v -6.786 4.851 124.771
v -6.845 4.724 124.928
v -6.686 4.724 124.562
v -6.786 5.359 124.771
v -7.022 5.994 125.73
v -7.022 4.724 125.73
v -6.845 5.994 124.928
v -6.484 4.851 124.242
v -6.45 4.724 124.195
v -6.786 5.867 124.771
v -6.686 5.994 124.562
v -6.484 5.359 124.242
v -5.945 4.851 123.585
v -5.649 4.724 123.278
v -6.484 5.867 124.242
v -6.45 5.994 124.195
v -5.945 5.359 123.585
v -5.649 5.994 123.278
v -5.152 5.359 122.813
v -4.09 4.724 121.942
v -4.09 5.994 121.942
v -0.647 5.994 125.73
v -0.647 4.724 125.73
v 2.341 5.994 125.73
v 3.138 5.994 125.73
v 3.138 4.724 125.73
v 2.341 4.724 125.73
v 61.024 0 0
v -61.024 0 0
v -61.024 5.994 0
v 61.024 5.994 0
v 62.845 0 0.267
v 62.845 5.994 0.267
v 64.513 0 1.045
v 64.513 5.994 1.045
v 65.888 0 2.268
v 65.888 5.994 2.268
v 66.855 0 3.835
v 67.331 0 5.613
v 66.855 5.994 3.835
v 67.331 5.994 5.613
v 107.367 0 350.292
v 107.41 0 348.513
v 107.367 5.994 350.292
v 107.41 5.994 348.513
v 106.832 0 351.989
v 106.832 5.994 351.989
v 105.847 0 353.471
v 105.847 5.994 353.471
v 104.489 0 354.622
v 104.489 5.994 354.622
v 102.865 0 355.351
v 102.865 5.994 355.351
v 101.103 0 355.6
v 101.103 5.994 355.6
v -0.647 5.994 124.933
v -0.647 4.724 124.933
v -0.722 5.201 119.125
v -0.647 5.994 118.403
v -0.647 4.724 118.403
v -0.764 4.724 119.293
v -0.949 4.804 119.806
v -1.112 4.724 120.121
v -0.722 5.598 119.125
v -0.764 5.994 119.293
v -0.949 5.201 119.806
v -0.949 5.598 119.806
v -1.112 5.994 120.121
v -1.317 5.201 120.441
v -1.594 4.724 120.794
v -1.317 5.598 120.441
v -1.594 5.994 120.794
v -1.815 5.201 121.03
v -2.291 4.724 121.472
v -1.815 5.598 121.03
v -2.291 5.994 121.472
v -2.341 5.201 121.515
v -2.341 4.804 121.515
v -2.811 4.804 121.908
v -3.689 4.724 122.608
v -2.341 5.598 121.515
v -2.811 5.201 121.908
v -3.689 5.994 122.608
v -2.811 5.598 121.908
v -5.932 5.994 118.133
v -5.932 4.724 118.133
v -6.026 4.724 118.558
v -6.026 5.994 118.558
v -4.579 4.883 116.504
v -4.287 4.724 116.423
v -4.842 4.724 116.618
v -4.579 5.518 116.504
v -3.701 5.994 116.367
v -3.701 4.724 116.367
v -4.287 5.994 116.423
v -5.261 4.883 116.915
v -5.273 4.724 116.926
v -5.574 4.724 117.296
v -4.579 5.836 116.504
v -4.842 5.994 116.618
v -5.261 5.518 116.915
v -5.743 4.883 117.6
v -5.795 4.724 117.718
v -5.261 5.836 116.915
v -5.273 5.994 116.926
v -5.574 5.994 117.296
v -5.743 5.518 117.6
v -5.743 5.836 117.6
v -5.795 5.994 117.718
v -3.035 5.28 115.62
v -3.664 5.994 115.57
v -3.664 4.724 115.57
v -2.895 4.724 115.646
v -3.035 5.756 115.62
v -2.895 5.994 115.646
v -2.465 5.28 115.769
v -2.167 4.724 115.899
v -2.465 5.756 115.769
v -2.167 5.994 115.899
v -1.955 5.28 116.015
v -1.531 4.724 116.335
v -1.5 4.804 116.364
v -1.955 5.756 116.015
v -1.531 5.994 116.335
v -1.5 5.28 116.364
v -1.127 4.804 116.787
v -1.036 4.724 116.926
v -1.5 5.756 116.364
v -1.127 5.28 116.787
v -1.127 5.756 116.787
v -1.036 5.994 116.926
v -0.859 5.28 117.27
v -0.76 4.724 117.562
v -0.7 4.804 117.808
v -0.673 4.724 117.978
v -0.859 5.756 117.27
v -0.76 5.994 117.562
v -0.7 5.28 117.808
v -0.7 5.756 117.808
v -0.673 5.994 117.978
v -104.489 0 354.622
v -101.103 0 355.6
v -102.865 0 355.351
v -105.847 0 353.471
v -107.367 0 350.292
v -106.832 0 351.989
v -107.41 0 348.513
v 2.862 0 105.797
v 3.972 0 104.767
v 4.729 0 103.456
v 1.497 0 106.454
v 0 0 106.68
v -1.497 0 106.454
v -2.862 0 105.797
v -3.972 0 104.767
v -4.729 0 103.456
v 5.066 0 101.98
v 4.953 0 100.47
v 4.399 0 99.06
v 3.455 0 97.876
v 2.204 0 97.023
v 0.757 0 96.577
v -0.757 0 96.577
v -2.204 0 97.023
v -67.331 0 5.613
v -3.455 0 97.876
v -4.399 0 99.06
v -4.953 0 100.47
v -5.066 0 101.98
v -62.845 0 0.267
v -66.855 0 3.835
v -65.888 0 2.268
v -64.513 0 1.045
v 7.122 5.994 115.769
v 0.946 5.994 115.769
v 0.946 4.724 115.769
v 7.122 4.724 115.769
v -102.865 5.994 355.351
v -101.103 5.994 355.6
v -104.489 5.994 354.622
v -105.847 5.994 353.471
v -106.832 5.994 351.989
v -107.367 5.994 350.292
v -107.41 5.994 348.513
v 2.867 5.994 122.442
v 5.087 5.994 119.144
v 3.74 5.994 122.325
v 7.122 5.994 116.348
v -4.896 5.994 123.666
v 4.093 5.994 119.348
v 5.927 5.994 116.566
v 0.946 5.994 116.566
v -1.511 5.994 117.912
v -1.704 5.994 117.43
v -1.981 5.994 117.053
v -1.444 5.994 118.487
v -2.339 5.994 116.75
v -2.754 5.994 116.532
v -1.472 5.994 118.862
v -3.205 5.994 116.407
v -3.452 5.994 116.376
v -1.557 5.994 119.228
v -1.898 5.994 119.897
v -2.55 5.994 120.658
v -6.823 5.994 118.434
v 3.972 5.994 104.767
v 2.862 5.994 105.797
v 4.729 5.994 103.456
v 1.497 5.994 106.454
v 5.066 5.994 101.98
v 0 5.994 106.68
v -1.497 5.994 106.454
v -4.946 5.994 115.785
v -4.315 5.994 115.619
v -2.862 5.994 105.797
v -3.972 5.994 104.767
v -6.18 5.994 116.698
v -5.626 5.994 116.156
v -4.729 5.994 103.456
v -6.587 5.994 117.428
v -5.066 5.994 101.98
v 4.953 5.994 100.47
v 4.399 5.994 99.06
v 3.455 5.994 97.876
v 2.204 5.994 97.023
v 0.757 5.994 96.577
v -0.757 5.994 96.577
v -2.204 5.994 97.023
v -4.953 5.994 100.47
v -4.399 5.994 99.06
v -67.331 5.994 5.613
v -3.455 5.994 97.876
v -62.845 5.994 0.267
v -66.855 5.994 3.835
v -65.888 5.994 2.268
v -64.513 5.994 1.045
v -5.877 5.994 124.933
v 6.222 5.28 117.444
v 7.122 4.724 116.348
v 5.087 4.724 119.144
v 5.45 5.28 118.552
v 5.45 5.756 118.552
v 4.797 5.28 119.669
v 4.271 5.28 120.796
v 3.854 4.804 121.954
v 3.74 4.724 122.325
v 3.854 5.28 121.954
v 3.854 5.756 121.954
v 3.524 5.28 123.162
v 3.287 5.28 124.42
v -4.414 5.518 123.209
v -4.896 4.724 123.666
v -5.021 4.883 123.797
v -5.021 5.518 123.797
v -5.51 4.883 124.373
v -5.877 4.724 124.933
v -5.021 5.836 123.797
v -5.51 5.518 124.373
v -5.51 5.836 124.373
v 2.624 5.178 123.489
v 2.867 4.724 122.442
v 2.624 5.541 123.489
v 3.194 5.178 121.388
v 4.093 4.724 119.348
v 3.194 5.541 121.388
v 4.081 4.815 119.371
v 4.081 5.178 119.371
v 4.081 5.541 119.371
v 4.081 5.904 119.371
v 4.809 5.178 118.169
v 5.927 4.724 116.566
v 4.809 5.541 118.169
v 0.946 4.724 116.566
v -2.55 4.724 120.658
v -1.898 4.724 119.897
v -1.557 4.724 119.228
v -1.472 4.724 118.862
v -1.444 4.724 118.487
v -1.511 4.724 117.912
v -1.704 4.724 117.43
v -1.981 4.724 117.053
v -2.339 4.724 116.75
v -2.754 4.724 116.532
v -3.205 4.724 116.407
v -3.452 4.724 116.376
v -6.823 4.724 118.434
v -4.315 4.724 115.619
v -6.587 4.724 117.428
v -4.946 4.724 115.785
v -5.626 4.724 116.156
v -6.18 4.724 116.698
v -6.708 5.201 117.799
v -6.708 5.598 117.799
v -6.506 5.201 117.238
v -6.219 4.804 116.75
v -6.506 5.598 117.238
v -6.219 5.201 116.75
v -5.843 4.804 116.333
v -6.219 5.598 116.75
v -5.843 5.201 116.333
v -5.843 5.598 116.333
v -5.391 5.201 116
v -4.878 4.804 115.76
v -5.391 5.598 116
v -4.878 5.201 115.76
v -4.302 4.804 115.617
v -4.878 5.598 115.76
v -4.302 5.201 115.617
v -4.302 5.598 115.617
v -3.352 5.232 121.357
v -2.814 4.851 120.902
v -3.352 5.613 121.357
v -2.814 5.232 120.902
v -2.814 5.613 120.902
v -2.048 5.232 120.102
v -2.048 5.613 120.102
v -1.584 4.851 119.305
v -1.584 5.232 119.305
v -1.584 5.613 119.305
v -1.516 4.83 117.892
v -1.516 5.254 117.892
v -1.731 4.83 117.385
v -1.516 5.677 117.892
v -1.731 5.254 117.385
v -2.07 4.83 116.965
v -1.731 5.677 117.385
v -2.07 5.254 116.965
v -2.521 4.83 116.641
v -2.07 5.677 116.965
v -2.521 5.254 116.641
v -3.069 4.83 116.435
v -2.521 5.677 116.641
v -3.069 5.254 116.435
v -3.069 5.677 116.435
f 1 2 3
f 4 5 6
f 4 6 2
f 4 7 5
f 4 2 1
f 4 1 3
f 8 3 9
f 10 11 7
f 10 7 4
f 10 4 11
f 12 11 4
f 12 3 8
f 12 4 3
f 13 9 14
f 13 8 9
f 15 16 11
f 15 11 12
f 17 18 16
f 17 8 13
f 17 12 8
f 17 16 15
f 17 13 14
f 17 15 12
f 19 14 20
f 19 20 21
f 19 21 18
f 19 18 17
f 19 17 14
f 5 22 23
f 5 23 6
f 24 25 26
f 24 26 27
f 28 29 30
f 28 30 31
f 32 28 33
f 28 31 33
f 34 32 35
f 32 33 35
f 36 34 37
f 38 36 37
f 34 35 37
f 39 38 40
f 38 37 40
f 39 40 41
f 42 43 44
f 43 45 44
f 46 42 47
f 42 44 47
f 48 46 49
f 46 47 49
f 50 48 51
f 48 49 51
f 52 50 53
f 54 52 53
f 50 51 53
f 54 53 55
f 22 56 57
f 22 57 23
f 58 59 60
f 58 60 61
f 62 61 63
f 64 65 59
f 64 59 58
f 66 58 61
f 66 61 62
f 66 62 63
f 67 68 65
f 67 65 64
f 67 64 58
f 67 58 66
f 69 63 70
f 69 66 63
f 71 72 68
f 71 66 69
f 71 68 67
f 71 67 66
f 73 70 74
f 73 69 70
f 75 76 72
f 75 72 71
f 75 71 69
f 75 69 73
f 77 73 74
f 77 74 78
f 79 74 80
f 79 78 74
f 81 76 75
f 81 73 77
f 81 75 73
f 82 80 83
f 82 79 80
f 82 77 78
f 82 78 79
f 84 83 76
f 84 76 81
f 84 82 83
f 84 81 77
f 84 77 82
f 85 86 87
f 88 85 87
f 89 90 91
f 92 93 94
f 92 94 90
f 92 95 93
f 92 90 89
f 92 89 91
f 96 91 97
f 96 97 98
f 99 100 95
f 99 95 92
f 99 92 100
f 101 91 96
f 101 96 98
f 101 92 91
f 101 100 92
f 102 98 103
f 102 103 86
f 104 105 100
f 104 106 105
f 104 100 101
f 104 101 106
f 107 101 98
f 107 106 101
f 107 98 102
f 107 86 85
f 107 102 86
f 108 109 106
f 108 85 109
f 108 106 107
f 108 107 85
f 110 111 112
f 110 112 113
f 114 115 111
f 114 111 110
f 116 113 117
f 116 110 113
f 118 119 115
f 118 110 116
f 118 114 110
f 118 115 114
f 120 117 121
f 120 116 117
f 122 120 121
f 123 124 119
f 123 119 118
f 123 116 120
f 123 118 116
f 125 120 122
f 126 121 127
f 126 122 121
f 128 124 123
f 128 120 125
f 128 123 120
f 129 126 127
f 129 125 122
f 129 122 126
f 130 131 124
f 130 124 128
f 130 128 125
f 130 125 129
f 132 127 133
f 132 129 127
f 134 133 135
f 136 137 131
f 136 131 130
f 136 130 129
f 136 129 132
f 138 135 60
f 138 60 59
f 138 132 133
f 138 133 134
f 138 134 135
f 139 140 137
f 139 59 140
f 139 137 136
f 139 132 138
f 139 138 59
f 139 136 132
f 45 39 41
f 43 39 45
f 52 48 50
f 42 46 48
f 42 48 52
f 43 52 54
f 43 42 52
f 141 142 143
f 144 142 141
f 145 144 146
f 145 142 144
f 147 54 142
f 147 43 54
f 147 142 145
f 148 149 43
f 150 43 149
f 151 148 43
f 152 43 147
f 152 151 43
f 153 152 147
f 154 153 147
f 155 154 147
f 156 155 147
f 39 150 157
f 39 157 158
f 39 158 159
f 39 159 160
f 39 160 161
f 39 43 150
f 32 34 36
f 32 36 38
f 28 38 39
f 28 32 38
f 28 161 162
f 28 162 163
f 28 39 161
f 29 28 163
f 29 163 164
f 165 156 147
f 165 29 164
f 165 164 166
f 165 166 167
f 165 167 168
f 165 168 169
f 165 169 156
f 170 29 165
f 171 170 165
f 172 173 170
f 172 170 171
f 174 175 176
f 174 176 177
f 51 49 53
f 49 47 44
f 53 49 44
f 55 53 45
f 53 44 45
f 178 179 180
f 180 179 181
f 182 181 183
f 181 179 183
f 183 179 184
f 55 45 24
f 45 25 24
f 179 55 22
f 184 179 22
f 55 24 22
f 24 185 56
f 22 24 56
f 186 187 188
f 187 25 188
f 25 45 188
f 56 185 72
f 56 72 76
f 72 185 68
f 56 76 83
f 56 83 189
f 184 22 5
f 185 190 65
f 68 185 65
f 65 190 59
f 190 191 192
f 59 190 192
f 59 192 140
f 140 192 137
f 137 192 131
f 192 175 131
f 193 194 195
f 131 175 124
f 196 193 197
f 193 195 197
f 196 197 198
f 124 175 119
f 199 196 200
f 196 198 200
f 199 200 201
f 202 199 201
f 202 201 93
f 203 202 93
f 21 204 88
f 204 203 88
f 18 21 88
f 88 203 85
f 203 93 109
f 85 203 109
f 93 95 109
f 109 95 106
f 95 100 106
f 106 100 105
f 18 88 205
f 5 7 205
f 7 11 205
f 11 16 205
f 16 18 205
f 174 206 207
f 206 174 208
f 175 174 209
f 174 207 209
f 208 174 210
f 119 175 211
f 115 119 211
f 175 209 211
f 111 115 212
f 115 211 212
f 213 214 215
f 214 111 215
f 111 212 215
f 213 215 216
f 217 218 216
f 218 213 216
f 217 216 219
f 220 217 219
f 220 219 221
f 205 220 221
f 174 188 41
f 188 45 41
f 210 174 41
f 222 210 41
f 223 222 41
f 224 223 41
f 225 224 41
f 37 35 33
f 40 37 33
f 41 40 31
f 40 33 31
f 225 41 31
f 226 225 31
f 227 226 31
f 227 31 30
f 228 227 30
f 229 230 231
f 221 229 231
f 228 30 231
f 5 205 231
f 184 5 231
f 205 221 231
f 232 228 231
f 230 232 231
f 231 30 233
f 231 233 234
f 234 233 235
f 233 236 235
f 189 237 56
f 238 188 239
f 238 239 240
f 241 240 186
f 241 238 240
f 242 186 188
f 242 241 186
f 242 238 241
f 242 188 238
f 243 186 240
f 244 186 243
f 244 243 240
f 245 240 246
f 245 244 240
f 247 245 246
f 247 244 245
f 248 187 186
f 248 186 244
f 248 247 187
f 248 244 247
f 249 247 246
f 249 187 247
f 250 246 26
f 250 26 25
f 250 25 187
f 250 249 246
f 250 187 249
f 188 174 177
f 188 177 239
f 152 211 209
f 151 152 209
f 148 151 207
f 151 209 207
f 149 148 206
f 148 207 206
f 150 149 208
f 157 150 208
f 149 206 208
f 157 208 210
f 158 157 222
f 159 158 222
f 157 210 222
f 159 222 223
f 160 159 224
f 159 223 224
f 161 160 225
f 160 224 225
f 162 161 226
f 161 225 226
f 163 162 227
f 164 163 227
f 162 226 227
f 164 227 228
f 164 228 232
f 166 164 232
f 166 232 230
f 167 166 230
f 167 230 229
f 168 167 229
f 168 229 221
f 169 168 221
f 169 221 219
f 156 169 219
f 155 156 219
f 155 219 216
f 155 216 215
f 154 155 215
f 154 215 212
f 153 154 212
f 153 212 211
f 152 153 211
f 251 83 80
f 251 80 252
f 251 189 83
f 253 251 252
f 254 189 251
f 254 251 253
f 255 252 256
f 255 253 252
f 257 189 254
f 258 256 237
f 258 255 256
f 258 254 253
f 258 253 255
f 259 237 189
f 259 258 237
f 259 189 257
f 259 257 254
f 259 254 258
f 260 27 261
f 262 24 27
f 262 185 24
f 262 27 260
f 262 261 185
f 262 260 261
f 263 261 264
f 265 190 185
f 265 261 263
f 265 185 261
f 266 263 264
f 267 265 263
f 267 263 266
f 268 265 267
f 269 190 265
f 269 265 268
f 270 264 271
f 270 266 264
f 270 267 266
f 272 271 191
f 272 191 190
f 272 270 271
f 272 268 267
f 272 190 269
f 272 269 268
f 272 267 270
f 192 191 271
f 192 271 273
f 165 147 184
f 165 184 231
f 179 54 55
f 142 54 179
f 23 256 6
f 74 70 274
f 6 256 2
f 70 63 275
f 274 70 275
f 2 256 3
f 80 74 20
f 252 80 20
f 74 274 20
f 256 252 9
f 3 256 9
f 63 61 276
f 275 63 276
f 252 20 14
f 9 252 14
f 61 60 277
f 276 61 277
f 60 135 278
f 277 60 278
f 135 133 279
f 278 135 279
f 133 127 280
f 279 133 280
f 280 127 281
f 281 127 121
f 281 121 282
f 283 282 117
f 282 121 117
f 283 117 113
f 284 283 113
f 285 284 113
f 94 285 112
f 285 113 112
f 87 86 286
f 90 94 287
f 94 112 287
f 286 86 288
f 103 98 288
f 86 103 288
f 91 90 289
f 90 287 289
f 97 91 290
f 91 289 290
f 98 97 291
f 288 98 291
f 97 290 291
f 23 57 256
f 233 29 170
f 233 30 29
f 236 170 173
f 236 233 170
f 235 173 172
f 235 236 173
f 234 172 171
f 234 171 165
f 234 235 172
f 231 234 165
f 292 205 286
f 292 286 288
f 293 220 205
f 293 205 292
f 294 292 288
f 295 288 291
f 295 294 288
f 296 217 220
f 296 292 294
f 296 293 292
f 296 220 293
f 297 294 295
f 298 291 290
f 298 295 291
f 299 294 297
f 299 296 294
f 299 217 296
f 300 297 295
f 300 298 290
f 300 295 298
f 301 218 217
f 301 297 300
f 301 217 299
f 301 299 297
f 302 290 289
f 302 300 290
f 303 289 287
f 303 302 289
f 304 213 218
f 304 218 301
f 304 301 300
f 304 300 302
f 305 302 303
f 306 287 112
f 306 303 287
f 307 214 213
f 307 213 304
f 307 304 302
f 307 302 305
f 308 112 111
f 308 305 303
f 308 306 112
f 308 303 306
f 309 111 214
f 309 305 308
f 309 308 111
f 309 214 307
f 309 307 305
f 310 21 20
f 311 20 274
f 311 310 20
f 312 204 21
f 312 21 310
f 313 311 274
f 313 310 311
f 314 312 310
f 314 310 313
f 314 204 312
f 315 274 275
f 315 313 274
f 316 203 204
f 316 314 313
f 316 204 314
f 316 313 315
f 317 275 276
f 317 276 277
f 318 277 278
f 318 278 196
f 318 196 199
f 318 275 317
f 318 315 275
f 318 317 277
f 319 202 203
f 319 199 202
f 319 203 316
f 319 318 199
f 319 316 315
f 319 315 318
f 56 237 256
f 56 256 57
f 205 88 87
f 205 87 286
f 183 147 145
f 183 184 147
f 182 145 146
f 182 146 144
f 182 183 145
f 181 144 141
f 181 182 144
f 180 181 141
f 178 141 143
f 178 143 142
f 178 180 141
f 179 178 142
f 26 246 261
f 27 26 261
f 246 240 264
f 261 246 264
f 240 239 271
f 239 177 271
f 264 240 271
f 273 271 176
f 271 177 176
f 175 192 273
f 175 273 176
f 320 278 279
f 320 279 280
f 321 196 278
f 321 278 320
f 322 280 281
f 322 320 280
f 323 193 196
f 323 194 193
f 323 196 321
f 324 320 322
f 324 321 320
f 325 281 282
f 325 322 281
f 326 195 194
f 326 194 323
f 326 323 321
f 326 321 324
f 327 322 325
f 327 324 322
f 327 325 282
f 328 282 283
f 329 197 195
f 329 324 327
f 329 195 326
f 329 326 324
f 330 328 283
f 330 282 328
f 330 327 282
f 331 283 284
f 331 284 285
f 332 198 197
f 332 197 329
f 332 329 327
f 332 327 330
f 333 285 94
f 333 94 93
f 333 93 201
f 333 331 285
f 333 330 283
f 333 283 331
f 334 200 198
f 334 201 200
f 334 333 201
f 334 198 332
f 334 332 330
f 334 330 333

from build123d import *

# Parameters (mm, degrees)
BOSS_EXTRUDE1_DEPTH = 5.9944
SKETCH2_R           = 5.08
CUT_EXTRUDE1_DEPTH  = 372.756512027
CUT_EXTRUDE2_DEPTH  = 1.27
FILLET1_R           = 6.35


with BuildPart() as part:
    # Sketch1 → Boss-Extrude1 (new body)
    with BuildSketch(Plane(origin=(0, 0, 0), x_dir=(1, 0, 0), z_dir=(0, 1, 0))):
        Polygon((-66.675, 0), (66.675, 0), (108.238677943, -355.6), (-108.238677943, -355.6), align=None)
    extrude(amount=BOSS_EXTRUDE1_DEPTH)

    # Sketch2 → Cut-Extrude1 (cut, through all)
    with BuildSketch(Plane(origin=(0, 5.9944, 0), x_dir=(1, 0, 0), z_dir=(0, 1, 0))):
        with Locations(Location((0, -101.6, 0), (0, 0, 270))):
            Circle(SKETCH2_R)
    extrude(amount=-CUT_EXTRUDE1_DEPTH, mode=Mode.SUBTRACT)

    # Sketch3 → Cut-Extrude2 (cut)
    with BuildSketch(Plane(origin=(0, 5.9944, 0), x_dir=(1, 0, 0), z_dir=(0, 1, 0))):
        with BuildLine():
            Line((-0.64745098, -125.73), (-7.022352941, -125.73))
            add(Edge.make_bspline(
                [(-7.022352941, -125.73), (-6.995700037, -125.56647139), (-6.94264637, -125.240961184), (-6.822439521, -124.833851847), (-6.660985096, -124.502541973), (-6.475064564, -124.222842773), (-6.235482524, -123.909374898), (-5.933210944, -123.565961589), (-5.569119359, -123.193461978), (-5.137584514, -122.795086731), (-4.639123135, -122.372704423), (-4.278935295, -122.089977316), (-4.090147059, -121.941789216)],
                knots=[0, 0, 0, 0, 1.00794059, 2.006345856, 2.568221262, 3.244176762, 4.045978883, 4.967707078, 6.025786227, 7.214078669, 8.539791974, 10, 10, 10, 10], degree=3))
            add(Edge.make_bspline(
                [(-4.090147059, -121.941789216), (-3.959237505, -121.839291022), (-3.712095896, -121.645786669), (-3.367780634, -121.370812364), (-3.073520037, -121.12638684), (-2.749807849, -120.849934026), (-2.401956914, -120.521669006), (-2.050459284, -120.119964738), (-1.769921232, -119.720001197), (-1.574792785, -119.317093709), (-1.462696622, -118.90576348), (-1.450487068, -118.627391436), (-1.444313725, -118.486642157)],
                knots=[0, 0, 0, 0, 1.105083233, 2.086265203, 2.928643677, 3.647492745, 4.915719202, 6.103603942, 7.190110835, 8.152548768, 9.065899631, 10, 10, 10, 10], degree=3))
            add(Edge.make_bspline(
                [(-1.444313725, -118.486642157), (-1.447965678, -118.383696155), (-1.455062496, -118.183641793), (-1.508208178, -117.89411156), (-1.598896834, -117.626810225), (-1.725875028, -117.381877206), (-1.879897972, -117.157206868), (-2.067602091, -116.959226462), (-2.280144186, -116.783379567), (-2.521172126, -116.634524628), (-2.784585903, -116.511539466), (-3.072628503, -116.429562416), (-3.379272721, -116.373277743), (-3.591834853, -116.369040126), (-3.701053922, -116.366862745)],
                knots=[0, 0, 0, 0, 1.066440105, 2.072406788, 3.038089023, 3.980626898, 4.923164774, 5.851240192, 6.79842777, 7.774055624, 8.779619978, 9.800248095, 10.869719403, 12, 12, 12, 12], degree=3))
            add(Edge.make_bspline(
                [(-3.701053922, -116.366862745), (-3.856272912, -116.372784339), (-4.153856816, -116.384137145), (-4.575842478, -116.488503349), (-4.94872481, -116.662202163), (-5.273158686, -116.90555858), (-5.541086806, -117.223699711), (-5.760536331, -117.605911882), (-5.924737114, -118.058408876), (-5.991270058, -118.385922919), (-6.02627451, -118.558235294)],
                knots=[0, 0, 0, 0, 1.052503955, 2.0178474, 2.928593632, 3.828899676, 4.748107049, 5.732867451, 6.807211463, 8, 8, 8, 8], degree=3))
            Line((-6.02627451, -118.558235294), (-6.823137255, -118.43372549))
            add(Edge.make_bspline(
                [(-6.823137255, -118.43372549), (-6.80933515, -118.324490516), (-6.782336166, -118.110810556), (-6.71294302, -117.80167694), (-6.623223382, -117.510865089), (-6.510230906, -117.238067127), (-6.37723078, -116.983643092), (-6.222961391, -116.746154212), (-6.045126303, -116.528535029), (-5.846128896, -116.329076963), (-5.627309849, -116.151961167), (-5.393797446, -115.994859502), (-5.142464654, -115.86447923), (-4.877381927, -115.754431463), (-4.595667611, -115.670607699), (-4.298686261, -115.611680986), (-3.986147006, -115.577611658), (-3.772730074, -115.57257374), (-3.66370098, -115.57)],
                knots=[0, 0, 0, 0, 1.11558569, 2.182252598, 3.206865404, 4.197163727, 5.171016007, 6.113287932, 7.062752653, 8.014719109, 8.96418383, 9.912249364, 10.862587531, 11.829428462, 12.817713982, 13.836697005, 14.894825442, 16, 16, 16, 16], degree=3))
            add(Edge.make_bspline(
                [(-3.66370098, -115.57), (-3.556720592, -115.572319789), (-3.346239788, -115.576883907), (-3.037889894, -115.614942211), (-2.744018161, -115.6768103), (-2.465296832, -115.763662981), (-2.202890774, -115.877884746), (-1.951202346, -116.010088278), (-1.717482433, -116.17490368), (-1.497639325, -116.359297976), (-1.299748734, -116.564753592), (-1.122645846, -116.782681404), (-0.976555662, -117.018893798), (-0.853169483, -117.266964655), (-0.764695454, -117.53292748), (-0.694872253, -117.809240088), (-0.653577585, -118.101497133), (-0.649522593, -118.30078564), (-0.64745098, -118.402598039)],
                knots=[0, 0, 0, 0, 1.106681904, 2.177364475, 3.209175827, 4.210887483, 5.192078542, 6.167200624, 7.147039734, 8.145062256, 9.132109826, 10.094560107, 11.044836899, 12.000375742, 12.954465884, 13.938765234, 14.946957558, 16, 16, 16, 16], degree=3))
            add(Edge.make_bspline(
                [(-0.64745098, -118.402598039), (-0.651019305, -118.525228757), (-0.6580732, -118.767646194), (-0.715129167, -119.12624646), (-0.813824447, -119.47254261), (-0.943374808, -119.810657932), (-1.113892336, -120.134164725), (-1.314350095, -120.448008584), (-1.547654564, -120.749083332), (-1.770342076, -120.99003171), (-1.97351953, -121.182307301), (-2.148031694, -121.345116208), (-2.346754424, -121.522181935), (-2.570668292, -121.711175794), (-2.818646639, -121.913074715), (-3.084581883, -122.135434202), (-3.377659732, -122.368392422), (-3.582554579, -122.526226013), (-3.688602941, -122.607916667)],
                knots=[0, 0, 0, 0, 1.088993338, 2.152731221, 3.214950677, 4.282992305, 5.363056107, 6.45734114, 7.587448717, 8.741912054, 9.367708333, 10.072059012, 10.861970471, 11.731730561, 12.674646287, 13.702521352, 14.810883478, 16, 16, 16, 16], degree=3))
            add(Edge.make_bspline(
                [(-3.688602941, -122.607916667), (-3.814880187, -122.707673071), (-4.061272368, -122.90231778), (-4.409564614, -123.201952264), (-4.73097902, -123.495186281), (-5.017964452, -123.789920338), (-5.277411759, -124.07905832), (-5.50700849, -124.36473001), (-5.710619134, -124.64507084), (-5.822395863, -124.838757211), (-5.876862745, -124.933137255)],
                knots=[0, 0, 0, 0, 1.201760701, 2.344875646, 3.430713183, 4.449969728, 5.415927222, 6.330865599, 7.186659457, 8, 8, 8, 8], degree=3))
            Line((-5.876862745, -124.933137255), (-0.64745098, -124.933137255))
            Line((-0.64745098, -124.933137255), (-0.64745098, -125.73))
        make_face()
        with BuildLine():
            add(Edge.make_bspline(
                [(7.121960784, -116.348186275), (6.966339865, -116.529937257), (6.658951614, -116.888938584), (6.220934138, -117.43618394), (5.820990618, -117.99084912), (5.449181724, -118.546249507), (5.106128688, -119.103037308), (4.794532343, -119.662337897), (4.516462749, -120.225992354), (4.26698415, -120.792977059), (4.044548147, -121.3683878), (3.850270964, -121.955372575), (3.67057882, -122.552241729), (3.519790538, -123.16358515), (3.387268651, -123.786079212), (3.284032091, -124.423321677), (3.193868357, -125.071600422), (3.156448534, -125.509818618), (3.137647059, -125.73)],
                knots=[0, 0, 0, 0, 1.105388324, 2.183404297, 3.237157451, 4.263515625, 5.270618974, 6.257661546, 7.220201142, 8.173180298, 9.11857031, 10.06900231, 11.029056015, 11.99749775, 12.977109533, 13.9684726, 14.979265319, 16, 16, 16, 16], degree=3))
            Line((3.137647059, -125.73), (2.340784314, -125.73))
            add(Edge.make_bspline(
                [(2.340784314, -125.73), (2.370678975, -125.349642584), (2.429735016, -124.598257492), (2.61102689, -123.492894729), (2.858878127, -122.422284677), (3.182435664, -121.380929429), (3.581330157, -120.3591781), (3.949835575, -119.60787323), (4.230188707, -119.095806913), (4.404577952, -118.809755188), (4.594967573, -118.495142394), (4.815641098, -118.158570547), (5.057471949, -117.794755527), (5.324466786, -117.406124805), (5.619249624, -116.995425039), (5.821900516, -116.712397552), (5.926666667, -116.566078431)],
                knots=[0, 0, 0, 0, 1.601249526, 3.163222193, 4.697516546, 6.211791823, 7.737472103, 9.298034817, 9.721151344, 10.188082837, 10.704348124, 11.265001787, 11.877561367, 12.538519795, 13.244446179, 14, 14, 14, 14], degree=3))
            Line((5.926666667, -116.566078431), (0.94627451, -116.566078431))
            Line((0.94627451, -116.566078431), (0.94627451, -115.769215686))
            Line((0.94627451, -115.769215686), (7.121960784, -115.769215686))
            Line((7.121960784, -115.769215686), (7.121960784, -116.348186275))
        make_face()
    extrude(amount=-CUT_EXTRUDE2_DEPTH, mode=Mode.SUBTRACT)

    # Fillet1
    fillet1_edges = [part.edges().sort_by_distance(p)[0] for p in [
        (108.238677943, 2.9972, 355.6),
        (-108.238677943, 2.9972, 355.6),
        (-66.675, 2.9972, 0),
        (66.675, 2.9972, 0),
    ]]
    fillet(fillet1_edges, radius=FILLET1_R)


solid = part.part
